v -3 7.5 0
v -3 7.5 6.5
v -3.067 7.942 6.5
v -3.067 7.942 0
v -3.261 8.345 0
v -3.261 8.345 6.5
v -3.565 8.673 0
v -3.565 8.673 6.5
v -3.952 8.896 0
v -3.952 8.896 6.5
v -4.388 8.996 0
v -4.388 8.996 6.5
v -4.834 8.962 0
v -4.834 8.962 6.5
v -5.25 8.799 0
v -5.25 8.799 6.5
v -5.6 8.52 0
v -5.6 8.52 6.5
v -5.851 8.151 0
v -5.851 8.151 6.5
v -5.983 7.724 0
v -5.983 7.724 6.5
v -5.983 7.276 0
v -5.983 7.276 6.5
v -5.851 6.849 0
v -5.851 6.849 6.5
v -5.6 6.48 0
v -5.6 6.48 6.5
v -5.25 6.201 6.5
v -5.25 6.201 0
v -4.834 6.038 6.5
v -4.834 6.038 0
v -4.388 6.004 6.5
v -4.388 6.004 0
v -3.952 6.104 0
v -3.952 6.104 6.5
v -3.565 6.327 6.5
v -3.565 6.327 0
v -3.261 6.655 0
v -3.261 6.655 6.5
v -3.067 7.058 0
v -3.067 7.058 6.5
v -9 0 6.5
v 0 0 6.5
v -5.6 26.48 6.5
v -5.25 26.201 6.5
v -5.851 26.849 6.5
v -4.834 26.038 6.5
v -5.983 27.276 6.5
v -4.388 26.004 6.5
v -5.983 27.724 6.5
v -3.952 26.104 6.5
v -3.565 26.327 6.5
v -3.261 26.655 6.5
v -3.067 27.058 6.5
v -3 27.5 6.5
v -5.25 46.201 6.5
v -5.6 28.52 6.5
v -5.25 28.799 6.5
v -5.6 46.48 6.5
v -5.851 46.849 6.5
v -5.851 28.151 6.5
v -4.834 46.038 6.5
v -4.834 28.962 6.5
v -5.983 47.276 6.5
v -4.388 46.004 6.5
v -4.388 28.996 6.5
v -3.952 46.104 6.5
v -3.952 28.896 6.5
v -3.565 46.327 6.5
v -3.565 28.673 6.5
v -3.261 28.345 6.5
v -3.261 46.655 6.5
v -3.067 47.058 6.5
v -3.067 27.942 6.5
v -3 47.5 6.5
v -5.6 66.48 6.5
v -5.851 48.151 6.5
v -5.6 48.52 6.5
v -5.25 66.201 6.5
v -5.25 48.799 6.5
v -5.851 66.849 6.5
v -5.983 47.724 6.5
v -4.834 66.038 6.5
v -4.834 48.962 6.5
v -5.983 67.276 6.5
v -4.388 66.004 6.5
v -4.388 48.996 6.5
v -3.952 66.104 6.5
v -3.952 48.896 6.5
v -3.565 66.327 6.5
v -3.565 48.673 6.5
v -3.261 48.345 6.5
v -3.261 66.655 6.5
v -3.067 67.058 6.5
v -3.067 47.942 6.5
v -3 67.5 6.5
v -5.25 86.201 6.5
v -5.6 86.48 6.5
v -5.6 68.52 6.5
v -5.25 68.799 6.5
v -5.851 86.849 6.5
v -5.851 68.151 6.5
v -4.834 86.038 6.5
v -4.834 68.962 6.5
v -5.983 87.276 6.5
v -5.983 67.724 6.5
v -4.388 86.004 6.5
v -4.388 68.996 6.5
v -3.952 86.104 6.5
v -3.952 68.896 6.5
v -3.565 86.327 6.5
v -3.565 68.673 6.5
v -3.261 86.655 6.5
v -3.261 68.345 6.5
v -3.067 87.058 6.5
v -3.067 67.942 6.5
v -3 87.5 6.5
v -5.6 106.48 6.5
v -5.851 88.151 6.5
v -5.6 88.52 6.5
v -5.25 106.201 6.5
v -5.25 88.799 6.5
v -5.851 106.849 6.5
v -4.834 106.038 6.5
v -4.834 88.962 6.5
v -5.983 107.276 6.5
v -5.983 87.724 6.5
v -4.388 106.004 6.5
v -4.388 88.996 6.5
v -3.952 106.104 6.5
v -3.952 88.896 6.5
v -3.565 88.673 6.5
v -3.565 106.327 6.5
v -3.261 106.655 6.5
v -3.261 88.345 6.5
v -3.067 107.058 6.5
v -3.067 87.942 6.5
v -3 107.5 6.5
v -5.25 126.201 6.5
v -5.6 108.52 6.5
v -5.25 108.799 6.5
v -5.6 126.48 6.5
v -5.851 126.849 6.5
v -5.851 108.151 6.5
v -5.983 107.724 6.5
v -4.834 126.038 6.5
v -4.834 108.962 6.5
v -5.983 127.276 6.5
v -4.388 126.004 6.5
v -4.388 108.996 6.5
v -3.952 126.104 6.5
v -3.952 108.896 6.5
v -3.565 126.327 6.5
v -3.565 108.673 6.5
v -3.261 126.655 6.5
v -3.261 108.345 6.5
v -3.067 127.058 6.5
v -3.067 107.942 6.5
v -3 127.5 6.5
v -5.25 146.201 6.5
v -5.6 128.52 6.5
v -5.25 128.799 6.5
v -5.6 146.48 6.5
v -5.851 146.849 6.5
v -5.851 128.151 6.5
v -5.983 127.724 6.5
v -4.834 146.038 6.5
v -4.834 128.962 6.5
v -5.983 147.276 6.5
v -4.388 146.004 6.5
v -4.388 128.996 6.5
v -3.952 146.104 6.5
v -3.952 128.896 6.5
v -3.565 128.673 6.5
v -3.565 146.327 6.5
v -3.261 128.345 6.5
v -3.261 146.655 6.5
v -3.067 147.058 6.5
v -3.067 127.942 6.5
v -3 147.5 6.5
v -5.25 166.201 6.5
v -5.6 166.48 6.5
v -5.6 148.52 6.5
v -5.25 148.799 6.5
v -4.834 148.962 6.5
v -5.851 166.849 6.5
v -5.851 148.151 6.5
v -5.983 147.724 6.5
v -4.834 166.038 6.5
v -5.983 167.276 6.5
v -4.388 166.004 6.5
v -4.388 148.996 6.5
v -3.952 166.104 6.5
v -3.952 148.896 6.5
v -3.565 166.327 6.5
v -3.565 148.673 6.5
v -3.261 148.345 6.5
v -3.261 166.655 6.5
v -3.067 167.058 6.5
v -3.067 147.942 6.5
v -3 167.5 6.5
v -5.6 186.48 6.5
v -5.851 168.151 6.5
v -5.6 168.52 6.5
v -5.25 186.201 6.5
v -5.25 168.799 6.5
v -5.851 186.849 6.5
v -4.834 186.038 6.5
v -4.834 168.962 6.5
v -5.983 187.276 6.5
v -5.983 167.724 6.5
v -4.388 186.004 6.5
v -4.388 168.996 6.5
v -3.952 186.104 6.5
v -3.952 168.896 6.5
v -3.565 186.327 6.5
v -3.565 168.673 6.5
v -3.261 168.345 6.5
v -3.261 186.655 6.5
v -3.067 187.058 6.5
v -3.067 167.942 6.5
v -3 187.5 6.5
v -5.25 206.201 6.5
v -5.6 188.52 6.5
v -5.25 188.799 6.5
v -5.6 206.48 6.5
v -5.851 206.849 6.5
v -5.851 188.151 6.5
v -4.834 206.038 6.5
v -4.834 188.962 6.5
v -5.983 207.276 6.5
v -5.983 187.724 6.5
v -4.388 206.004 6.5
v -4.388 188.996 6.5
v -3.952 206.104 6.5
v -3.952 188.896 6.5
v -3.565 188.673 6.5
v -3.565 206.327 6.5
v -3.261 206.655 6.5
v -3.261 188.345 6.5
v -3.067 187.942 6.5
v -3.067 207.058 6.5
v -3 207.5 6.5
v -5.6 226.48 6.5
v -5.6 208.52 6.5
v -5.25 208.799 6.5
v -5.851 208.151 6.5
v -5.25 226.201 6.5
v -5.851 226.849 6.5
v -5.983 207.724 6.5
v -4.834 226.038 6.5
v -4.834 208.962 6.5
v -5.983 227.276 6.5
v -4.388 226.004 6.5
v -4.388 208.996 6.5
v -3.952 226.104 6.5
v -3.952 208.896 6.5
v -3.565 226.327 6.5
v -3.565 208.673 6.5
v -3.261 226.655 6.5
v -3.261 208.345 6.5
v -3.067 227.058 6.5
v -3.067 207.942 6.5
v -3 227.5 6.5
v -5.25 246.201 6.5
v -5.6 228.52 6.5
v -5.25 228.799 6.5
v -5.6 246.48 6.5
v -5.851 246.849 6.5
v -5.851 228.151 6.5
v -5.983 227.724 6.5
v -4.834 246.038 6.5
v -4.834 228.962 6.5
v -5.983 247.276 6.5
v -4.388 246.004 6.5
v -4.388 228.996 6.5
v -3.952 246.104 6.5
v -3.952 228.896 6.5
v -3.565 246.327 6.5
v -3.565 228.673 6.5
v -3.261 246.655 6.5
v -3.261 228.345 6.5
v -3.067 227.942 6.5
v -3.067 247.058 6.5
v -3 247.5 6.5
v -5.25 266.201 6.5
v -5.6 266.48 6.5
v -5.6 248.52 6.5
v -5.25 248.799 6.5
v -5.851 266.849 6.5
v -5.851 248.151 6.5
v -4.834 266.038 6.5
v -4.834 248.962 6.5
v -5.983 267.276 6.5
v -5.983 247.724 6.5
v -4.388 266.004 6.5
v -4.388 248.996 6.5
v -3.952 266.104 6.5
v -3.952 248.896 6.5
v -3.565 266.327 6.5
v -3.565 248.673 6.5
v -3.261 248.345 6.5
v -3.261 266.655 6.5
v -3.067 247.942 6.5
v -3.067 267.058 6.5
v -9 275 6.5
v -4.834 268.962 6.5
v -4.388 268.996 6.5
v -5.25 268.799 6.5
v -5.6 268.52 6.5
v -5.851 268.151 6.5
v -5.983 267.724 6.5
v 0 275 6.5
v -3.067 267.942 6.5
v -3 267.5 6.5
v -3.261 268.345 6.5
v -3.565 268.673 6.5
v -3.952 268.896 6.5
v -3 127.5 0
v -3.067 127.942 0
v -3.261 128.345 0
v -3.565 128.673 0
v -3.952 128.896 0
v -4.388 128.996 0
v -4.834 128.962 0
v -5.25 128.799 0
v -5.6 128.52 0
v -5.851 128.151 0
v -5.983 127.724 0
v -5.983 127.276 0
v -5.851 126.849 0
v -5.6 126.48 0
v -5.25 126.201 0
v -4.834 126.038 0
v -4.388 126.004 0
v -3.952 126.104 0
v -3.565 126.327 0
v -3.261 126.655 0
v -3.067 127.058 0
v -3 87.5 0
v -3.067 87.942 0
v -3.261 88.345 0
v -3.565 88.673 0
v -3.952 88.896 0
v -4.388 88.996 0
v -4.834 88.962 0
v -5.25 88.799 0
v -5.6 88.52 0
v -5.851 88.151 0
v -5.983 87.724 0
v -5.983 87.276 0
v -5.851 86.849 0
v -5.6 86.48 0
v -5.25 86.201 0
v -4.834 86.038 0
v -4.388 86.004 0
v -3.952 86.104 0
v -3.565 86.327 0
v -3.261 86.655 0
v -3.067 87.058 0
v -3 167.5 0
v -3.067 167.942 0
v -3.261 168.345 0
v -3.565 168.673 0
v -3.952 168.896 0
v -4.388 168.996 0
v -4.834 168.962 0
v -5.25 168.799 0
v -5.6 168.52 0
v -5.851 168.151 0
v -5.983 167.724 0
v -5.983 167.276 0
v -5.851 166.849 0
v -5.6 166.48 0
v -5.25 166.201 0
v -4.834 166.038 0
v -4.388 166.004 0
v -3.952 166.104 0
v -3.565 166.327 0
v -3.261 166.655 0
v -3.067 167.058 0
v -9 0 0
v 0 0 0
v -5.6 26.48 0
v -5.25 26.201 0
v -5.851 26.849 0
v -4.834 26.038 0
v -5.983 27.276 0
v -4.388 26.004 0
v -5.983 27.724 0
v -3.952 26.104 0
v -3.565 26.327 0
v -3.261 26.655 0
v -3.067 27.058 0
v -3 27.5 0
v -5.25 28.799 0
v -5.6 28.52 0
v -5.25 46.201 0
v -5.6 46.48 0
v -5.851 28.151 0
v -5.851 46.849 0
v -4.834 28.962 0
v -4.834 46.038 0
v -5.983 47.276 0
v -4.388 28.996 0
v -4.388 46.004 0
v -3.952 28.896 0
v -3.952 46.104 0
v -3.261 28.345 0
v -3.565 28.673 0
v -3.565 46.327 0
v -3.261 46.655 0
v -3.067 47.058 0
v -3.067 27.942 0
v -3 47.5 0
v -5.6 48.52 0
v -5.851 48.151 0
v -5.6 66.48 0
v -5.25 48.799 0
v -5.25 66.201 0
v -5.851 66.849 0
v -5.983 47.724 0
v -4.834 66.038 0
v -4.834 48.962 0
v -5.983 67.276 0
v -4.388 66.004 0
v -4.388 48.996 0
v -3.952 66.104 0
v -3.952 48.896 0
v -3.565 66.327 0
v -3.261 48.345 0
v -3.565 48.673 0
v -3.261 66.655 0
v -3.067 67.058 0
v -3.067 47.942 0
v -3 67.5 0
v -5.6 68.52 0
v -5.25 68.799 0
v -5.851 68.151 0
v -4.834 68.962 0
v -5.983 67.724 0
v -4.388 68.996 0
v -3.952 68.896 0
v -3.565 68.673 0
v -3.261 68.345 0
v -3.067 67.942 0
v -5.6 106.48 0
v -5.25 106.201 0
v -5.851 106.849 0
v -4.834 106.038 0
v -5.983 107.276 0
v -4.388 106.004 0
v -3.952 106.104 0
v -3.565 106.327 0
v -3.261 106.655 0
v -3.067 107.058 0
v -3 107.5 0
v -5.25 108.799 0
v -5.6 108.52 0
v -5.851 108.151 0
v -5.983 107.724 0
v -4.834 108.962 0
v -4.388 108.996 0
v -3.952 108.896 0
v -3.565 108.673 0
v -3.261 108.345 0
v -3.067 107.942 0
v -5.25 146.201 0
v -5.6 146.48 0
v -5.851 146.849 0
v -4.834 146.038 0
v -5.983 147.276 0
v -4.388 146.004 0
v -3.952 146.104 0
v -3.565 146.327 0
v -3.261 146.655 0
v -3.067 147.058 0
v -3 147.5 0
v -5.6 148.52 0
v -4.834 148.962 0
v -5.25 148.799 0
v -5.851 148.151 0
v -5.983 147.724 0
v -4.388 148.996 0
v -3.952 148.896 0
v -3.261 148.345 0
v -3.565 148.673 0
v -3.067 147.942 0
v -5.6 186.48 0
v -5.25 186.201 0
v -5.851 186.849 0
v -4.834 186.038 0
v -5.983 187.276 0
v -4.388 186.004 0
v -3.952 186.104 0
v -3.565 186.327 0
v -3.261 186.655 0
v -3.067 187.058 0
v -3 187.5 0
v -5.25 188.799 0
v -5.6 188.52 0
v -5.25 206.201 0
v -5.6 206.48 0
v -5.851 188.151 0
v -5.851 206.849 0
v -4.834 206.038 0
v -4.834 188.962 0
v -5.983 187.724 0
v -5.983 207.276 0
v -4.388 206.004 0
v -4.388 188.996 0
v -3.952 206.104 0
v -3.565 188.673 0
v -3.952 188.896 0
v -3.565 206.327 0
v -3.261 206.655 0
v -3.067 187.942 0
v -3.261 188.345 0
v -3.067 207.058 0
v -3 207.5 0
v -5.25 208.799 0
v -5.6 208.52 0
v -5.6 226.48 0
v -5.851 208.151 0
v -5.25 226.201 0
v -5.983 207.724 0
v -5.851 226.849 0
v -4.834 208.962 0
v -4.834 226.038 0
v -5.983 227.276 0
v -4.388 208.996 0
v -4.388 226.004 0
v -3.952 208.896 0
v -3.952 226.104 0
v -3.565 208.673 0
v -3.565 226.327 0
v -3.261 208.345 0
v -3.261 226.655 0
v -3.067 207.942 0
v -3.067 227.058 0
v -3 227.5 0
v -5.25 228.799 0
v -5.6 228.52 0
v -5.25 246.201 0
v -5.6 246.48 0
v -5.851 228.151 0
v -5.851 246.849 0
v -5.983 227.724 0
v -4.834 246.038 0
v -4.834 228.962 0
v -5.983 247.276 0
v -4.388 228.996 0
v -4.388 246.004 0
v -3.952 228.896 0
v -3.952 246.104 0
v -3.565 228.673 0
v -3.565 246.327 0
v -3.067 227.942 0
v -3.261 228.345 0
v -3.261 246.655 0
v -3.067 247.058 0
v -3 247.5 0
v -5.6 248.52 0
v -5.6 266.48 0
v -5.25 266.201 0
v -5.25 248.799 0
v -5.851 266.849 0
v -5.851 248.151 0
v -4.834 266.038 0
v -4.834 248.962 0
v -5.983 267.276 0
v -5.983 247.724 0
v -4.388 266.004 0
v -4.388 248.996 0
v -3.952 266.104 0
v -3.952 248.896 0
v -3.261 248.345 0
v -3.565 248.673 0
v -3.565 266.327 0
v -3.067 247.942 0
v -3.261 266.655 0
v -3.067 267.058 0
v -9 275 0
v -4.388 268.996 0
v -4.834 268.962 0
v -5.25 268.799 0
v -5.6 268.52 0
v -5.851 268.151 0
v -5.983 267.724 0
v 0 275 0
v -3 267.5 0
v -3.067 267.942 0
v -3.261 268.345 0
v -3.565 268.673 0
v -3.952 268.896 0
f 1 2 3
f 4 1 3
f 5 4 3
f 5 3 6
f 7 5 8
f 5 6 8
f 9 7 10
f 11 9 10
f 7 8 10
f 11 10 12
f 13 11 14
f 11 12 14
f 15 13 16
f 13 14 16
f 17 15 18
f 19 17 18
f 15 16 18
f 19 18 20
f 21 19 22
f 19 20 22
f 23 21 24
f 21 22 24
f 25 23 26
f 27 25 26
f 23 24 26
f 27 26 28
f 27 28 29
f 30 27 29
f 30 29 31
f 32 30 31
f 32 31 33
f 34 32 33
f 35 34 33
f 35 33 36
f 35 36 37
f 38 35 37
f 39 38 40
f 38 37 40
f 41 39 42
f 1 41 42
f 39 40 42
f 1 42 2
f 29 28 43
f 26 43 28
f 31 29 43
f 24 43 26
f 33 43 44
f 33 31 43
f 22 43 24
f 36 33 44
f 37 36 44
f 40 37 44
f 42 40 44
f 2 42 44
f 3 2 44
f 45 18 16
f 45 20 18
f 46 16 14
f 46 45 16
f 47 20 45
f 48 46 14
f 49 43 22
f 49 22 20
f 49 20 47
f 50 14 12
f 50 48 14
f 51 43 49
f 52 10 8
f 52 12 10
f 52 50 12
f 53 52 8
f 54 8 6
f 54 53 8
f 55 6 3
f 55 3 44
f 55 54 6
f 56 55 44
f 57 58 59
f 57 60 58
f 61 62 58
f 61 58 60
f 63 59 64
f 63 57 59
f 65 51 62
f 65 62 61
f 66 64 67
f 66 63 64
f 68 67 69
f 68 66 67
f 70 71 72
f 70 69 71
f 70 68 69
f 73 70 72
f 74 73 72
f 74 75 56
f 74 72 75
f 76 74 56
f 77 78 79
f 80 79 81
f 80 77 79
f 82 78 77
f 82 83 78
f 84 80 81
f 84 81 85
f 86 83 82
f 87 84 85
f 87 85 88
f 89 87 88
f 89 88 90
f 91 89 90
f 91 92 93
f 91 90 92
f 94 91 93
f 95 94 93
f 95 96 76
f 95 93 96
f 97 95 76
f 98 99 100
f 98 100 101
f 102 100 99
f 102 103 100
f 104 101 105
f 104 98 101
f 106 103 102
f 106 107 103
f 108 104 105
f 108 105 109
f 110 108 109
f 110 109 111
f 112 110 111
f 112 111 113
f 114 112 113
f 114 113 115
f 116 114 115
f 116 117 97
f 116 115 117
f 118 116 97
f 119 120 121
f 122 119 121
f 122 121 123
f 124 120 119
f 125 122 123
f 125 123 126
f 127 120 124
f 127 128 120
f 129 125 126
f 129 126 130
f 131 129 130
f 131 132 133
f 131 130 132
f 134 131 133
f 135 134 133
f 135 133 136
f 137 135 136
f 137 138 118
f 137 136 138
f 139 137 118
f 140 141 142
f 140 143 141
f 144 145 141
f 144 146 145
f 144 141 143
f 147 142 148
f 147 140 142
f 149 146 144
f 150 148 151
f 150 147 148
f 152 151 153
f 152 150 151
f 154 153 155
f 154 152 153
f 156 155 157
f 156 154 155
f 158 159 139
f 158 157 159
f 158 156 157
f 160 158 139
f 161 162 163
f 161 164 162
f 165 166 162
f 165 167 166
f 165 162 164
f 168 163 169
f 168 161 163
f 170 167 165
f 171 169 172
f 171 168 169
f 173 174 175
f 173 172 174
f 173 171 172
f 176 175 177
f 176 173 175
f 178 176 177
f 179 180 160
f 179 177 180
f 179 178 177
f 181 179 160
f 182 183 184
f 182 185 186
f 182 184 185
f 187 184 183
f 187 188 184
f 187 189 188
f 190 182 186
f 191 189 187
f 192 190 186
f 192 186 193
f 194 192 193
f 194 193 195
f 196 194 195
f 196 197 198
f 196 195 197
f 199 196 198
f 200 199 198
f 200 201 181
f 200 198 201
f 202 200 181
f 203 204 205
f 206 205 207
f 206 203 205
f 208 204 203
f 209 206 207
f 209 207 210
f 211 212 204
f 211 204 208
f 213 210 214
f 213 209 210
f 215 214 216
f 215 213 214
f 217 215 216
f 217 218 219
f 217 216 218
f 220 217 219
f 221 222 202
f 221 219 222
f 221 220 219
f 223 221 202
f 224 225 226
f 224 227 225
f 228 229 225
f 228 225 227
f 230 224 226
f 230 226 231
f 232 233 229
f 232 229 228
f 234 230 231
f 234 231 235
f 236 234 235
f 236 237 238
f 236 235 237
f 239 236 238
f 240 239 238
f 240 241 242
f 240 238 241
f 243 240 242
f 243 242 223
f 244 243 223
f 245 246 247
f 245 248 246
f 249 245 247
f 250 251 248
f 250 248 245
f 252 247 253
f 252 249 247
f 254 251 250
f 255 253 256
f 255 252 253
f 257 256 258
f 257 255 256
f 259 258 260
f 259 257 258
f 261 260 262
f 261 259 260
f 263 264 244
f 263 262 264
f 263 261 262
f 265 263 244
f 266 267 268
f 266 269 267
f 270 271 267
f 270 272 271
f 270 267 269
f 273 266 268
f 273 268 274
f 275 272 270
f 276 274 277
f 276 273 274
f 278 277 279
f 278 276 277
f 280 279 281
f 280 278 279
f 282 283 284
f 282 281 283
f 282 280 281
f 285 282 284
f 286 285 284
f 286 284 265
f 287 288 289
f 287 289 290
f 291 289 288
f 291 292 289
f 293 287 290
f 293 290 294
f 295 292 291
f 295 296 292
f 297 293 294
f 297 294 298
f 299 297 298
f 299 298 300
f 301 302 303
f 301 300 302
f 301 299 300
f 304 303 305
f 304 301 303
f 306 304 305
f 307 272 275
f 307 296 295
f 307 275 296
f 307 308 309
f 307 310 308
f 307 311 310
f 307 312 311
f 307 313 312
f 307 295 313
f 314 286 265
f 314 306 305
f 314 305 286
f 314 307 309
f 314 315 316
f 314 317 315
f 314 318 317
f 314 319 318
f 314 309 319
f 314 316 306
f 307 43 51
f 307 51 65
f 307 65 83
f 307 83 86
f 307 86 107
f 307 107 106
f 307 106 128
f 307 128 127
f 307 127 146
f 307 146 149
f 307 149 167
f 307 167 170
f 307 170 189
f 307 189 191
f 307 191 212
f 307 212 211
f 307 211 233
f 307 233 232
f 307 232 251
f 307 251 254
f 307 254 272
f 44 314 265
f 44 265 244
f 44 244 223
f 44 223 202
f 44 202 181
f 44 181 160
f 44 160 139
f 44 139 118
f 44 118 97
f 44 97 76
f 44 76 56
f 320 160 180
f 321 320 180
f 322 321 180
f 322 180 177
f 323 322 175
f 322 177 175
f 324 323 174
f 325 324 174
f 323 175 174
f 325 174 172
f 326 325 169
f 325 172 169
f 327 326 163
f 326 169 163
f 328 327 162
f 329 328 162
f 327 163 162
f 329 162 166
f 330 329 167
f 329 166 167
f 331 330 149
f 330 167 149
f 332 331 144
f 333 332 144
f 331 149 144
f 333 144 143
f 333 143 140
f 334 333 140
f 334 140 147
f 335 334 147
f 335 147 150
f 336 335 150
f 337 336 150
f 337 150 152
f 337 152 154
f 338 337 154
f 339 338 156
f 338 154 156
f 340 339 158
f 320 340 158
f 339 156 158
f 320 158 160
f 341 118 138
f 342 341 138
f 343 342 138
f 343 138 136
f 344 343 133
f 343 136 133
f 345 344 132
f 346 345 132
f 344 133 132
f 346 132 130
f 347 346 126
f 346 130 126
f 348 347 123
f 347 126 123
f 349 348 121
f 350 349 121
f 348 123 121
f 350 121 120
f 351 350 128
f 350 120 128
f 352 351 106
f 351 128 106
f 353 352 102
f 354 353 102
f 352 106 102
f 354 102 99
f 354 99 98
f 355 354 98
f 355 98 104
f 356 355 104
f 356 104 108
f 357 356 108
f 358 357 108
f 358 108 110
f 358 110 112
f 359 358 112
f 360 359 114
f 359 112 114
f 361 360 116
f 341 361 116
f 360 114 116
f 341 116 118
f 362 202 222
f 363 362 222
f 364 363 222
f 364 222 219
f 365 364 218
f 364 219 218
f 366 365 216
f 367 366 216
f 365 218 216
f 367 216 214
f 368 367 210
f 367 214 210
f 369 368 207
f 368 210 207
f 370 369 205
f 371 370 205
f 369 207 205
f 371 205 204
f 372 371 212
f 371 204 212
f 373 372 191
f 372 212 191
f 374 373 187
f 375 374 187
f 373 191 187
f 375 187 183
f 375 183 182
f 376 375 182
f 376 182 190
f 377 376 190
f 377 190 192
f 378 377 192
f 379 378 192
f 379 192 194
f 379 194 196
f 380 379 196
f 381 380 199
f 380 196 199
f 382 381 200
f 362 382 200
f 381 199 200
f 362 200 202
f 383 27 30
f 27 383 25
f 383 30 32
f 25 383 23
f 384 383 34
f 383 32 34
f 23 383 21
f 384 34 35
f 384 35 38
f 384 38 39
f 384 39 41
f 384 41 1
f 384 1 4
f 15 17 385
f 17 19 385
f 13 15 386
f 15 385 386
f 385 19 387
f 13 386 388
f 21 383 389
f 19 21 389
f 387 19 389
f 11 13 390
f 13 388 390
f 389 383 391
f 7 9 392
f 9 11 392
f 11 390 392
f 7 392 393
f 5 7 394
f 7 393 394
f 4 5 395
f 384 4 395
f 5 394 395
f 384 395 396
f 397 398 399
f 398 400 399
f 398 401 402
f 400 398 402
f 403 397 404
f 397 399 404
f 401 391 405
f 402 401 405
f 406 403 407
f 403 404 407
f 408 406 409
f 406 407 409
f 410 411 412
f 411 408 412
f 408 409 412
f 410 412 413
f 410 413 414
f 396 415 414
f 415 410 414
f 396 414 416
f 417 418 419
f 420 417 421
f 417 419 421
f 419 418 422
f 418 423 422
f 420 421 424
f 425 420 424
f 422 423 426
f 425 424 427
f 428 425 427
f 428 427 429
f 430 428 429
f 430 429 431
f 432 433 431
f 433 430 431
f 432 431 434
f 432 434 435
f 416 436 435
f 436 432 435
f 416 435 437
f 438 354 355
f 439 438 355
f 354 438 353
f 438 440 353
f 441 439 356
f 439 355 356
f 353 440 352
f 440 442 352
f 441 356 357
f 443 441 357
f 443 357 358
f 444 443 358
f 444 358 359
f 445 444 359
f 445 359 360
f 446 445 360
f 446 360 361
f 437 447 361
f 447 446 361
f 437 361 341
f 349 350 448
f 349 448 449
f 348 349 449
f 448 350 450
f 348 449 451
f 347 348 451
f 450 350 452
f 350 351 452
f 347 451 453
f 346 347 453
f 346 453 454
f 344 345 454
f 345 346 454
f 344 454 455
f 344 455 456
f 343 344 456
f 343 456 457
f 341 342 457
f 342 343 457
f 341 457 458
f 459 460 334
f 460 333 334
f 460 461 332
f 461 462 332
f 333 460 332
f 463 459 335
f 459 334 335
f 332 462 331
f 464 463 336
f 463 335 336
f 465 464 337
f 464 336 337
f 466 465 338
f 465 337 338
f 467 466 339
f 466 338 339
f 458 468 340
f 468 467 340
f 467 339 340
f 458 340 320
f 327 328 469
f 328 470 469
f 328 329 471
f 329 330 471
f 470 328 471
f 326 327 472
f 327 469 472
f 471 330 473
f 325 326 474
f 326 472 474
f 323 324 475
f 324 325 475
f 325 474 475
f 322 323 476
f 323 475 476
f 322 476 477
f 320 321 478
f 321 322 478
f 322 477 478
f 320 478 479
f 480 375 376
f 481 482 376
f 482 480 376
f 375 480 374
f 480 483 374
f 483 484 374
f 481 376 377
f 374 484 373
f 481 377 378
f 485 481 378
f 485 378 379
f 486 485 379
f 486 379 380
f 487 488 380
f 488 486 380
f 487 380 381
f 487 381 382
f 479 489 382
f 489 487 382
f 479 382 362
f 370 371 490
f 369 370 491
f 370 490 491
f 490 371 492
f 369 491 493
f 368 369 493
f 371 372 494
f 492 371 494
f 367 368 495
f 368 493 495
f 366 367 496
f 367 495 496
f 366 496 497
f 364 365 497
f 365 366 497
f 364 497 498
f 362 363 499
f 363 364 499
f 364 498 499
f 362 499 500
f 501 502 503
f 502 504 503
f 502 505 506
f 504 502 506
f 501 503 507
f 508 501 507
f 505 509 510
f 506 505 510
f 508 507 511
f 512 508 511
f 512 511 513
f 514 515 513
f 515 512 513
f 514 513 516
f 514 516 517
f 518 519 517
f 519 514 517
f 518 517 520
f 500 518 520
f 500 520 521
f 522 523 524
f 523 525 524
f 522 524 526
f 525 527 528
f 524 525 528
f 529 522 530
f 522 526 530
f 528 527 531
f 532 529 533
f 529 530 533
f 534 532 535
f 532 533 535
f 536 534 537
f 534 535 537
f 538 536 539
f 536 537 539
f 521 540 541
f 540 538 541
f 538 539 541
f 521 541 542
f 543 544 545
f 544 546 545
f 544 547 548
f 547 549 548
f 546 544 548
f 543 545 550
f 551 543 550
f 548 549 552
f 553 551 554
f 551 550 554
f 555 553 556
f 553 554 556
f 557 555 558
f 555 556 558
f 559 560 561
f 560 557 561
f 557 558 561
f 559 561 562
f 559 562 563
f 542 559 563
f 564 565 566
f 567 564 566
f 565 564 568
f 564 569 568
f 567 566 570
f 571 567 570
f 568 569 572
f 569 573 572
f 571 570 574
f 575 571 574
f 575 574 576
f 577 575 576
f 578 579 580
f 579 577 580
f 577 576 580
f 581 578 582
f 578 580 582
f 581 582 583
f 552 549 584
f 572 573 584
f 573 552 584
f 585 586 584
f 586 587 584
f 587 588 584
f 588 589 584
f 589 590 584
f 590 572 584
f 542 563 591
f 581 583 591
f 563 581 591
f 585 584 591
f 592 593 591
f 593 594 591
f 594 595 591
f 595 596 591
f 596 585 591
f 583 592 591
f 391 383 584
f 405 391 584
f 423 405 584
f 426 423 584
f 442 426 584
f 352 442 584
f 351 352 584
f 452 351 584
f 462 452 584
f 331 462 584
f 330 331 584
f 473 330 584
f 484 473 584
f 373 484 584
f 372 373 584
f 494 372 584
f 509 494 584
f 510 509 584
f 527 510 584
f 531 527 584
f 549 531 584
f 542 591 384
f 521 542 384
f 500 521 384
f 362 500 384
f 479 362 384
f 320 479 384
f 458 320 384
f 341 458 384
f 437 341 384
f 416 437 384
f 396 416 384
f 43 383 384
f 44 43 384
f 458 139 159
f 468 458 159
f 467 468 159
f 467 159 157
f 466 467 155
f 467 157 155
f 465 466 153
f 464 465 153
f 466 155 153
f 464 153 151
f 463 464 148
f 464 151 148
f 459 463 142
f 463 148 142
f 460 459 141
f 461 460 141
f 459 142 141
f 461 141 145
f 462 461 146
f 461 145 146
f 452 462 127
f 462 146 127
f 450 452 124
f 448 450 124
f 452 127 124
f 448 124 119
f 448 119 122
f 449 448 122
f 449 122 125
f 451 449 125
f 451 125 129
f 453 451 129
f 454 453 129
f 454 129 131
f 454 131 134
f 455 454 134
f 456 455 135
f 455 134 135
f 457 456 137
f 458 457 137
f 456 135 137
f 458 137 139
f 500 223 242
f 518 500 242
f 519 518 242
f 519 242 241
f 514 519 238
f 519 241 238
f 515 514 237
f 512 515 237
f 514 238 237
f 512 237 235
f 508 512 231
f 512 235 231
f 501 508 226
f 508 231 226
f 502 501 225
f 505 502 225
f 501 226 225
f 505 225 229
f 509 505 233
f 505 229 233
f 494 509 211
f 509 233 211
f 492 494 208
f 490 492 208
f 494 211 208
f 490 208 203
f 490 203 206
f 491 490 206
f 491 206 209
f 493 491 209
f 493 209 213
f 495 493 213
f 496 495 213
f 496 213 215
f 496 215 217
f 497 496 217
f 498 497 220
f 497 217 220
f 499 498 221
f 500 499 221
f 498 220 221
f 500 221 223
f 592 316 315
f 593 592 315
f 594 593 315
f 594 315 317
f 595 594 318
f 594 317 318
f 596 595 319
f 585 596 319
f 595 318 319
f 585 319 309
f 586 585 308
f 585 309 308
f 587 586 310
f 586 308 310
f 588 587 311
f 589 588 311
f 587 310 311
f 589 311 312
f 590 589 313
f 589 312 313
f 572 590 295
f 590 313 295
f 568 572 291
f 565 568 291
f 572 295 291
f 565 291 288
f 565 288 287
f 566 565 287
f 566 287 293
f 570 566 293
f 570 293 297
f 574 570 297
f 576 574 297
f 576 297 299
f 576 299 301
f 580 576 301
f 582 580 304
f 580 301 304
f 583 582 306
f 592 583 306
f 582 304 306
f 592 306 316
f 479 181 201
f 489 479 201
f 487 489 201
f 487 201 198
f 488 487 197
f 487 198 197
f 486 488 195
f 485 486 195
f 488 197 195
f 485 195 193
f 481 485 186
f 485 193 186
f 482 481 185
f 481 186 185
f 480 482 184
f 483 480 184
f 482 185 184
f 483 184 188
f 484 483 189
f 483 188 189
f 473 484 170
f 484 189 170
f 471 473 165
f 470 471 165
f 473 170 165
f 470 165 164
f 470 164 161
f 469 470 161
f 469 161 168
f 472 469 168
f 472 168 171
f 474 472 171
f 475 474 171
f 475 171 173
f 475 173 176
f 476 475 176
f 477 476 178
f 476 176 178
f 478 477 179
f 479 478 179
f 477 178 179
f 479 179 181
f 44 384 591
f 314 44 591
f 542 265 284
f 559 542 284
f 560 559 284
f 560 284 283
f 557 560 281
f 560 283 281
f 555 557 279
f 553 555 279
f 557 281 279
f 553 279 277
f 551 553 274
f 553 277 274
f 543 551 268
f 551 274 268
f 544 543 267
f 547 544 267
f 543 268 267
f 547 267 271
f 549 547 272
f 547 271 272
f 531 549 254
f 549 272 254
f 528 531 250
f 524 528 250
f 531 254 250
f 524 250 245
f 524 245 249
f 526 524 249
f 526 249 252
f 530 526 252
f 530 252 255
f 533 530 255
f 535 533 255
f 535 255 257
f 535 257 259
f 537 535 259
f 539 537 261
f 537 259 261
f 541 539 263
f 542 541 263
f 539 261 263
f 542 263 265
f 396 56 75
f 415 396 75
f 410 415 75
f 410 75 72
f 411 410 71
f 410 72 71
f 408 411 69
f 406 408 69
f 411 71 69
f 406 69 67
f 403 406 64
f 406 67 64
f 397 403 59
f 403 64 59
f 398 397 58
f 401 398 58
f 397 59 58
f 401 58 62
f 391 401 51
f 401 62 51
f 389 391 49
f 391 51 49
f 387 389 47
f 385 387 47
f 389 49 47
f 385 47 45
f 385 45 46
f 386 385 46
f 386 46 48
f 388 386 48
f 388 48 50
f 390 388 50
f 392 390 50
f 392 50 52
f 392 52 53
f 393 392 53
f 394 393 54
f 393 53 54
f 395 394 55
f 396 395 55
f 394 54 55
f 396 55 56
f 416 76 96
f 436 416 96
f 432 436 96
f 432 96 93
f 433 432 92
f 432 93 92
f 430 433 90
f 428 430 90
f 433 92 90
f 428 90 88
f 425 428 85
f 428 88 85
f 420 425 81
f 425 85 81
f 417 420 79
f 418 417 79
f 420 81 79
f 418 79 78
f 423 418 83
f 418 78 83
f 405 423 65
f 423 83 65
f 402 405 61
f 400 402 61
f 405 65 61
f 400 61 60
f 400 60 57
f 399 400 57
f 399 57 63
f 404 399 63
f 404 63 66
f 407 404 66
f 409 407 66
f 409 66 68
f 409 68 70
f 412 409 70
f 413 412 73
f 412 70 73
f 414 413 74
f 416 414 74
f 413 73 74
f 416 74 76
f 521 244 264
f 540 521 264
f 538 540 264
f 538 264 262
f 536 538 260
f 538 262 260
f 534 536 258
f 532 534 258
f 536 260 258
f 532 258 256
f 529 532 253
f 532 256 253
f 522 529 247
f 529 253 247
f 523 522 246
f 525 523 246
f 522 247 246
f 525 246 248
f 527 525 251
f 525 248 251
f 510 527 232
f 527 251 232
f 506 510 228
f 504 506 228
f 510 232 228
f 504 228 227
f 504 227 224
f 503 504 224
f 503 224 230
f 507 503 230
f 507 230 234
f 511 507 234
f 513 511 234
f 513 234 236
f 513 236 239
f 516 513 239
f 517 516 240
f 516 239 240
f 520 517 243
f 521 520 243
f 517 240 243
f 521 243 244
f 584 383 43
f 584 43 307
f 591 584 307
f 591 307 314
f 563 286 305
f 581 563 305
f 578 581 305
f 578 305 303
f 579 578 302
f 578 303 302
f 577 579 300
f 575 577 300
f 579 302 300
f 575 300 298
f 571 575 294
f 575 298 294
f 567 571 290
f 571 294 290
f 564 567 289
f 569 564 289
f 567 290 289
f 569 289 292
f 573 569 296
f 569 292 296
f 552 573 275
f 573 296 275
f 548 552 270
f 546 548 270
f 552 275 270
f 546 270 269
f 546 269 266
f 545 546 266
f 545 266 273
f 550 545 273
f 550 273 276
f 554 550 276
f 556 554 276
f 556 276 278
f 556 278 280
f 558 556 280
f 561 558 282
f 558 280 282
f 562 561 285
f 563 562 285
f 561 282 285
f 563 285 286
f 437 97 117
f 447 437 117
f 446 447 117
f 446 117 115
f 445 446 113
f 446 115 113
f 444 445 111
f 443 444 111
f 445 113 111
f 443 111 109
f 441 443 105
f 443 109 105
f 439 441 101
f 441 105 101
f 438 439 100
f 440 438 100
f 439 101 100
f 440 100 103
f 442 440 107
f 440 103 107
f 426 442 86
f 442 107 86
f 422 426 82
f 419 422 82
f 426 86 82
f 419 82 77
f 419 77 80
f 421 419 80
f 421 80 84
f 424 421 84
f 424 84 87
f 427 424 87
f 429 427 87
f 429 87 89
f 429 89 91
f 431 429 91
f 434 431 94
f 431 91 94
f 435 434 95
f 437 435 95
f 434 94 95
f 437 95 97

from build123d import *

# Parameters (mm, degrees)
SKETCH068_W            = 9
SKETCH068_H            = 275
PAD022_DEPTH           = 6.5
SKETCH067_R            = 1.5
POCKET041_DEPTH        = 6.5
LINEARPATTERN009_COUNT = 14
LINEARPATTERN009_PITCH = 20


with BuildPart() as part:
    # Sketch068 → Pad022 (new body)
    with BuildSketch(Plane.XY):
        with Locations((-4.5, 137.5)):
            Rectangle(SKETCH068_W, SKETCH068_H)
    extrude(amount=PAD022_DEPTH)

    # Sketch067 (on Face6 of Pad022) → Pocket041 (cut)
    with BuildSketch(Plane.XY.offset(6.5)):
        with Locations((-4.5, 7.5)):
            Circle(SKETCH067_R)
    pocket041 = extrude(amount=-POCKET041_DEPTH, mode=Mode.SUBTRACT)

    # LinearPattern009: Pocket041 ×14
    with Locations(*[(0, i * LINEARPATTERN009_PITCH, 0) for i in range(1, LINEARPATTERN009_COUNT)]):
        add(pocket041, mode=Mode.SUBTRACT)


solid = part.part
